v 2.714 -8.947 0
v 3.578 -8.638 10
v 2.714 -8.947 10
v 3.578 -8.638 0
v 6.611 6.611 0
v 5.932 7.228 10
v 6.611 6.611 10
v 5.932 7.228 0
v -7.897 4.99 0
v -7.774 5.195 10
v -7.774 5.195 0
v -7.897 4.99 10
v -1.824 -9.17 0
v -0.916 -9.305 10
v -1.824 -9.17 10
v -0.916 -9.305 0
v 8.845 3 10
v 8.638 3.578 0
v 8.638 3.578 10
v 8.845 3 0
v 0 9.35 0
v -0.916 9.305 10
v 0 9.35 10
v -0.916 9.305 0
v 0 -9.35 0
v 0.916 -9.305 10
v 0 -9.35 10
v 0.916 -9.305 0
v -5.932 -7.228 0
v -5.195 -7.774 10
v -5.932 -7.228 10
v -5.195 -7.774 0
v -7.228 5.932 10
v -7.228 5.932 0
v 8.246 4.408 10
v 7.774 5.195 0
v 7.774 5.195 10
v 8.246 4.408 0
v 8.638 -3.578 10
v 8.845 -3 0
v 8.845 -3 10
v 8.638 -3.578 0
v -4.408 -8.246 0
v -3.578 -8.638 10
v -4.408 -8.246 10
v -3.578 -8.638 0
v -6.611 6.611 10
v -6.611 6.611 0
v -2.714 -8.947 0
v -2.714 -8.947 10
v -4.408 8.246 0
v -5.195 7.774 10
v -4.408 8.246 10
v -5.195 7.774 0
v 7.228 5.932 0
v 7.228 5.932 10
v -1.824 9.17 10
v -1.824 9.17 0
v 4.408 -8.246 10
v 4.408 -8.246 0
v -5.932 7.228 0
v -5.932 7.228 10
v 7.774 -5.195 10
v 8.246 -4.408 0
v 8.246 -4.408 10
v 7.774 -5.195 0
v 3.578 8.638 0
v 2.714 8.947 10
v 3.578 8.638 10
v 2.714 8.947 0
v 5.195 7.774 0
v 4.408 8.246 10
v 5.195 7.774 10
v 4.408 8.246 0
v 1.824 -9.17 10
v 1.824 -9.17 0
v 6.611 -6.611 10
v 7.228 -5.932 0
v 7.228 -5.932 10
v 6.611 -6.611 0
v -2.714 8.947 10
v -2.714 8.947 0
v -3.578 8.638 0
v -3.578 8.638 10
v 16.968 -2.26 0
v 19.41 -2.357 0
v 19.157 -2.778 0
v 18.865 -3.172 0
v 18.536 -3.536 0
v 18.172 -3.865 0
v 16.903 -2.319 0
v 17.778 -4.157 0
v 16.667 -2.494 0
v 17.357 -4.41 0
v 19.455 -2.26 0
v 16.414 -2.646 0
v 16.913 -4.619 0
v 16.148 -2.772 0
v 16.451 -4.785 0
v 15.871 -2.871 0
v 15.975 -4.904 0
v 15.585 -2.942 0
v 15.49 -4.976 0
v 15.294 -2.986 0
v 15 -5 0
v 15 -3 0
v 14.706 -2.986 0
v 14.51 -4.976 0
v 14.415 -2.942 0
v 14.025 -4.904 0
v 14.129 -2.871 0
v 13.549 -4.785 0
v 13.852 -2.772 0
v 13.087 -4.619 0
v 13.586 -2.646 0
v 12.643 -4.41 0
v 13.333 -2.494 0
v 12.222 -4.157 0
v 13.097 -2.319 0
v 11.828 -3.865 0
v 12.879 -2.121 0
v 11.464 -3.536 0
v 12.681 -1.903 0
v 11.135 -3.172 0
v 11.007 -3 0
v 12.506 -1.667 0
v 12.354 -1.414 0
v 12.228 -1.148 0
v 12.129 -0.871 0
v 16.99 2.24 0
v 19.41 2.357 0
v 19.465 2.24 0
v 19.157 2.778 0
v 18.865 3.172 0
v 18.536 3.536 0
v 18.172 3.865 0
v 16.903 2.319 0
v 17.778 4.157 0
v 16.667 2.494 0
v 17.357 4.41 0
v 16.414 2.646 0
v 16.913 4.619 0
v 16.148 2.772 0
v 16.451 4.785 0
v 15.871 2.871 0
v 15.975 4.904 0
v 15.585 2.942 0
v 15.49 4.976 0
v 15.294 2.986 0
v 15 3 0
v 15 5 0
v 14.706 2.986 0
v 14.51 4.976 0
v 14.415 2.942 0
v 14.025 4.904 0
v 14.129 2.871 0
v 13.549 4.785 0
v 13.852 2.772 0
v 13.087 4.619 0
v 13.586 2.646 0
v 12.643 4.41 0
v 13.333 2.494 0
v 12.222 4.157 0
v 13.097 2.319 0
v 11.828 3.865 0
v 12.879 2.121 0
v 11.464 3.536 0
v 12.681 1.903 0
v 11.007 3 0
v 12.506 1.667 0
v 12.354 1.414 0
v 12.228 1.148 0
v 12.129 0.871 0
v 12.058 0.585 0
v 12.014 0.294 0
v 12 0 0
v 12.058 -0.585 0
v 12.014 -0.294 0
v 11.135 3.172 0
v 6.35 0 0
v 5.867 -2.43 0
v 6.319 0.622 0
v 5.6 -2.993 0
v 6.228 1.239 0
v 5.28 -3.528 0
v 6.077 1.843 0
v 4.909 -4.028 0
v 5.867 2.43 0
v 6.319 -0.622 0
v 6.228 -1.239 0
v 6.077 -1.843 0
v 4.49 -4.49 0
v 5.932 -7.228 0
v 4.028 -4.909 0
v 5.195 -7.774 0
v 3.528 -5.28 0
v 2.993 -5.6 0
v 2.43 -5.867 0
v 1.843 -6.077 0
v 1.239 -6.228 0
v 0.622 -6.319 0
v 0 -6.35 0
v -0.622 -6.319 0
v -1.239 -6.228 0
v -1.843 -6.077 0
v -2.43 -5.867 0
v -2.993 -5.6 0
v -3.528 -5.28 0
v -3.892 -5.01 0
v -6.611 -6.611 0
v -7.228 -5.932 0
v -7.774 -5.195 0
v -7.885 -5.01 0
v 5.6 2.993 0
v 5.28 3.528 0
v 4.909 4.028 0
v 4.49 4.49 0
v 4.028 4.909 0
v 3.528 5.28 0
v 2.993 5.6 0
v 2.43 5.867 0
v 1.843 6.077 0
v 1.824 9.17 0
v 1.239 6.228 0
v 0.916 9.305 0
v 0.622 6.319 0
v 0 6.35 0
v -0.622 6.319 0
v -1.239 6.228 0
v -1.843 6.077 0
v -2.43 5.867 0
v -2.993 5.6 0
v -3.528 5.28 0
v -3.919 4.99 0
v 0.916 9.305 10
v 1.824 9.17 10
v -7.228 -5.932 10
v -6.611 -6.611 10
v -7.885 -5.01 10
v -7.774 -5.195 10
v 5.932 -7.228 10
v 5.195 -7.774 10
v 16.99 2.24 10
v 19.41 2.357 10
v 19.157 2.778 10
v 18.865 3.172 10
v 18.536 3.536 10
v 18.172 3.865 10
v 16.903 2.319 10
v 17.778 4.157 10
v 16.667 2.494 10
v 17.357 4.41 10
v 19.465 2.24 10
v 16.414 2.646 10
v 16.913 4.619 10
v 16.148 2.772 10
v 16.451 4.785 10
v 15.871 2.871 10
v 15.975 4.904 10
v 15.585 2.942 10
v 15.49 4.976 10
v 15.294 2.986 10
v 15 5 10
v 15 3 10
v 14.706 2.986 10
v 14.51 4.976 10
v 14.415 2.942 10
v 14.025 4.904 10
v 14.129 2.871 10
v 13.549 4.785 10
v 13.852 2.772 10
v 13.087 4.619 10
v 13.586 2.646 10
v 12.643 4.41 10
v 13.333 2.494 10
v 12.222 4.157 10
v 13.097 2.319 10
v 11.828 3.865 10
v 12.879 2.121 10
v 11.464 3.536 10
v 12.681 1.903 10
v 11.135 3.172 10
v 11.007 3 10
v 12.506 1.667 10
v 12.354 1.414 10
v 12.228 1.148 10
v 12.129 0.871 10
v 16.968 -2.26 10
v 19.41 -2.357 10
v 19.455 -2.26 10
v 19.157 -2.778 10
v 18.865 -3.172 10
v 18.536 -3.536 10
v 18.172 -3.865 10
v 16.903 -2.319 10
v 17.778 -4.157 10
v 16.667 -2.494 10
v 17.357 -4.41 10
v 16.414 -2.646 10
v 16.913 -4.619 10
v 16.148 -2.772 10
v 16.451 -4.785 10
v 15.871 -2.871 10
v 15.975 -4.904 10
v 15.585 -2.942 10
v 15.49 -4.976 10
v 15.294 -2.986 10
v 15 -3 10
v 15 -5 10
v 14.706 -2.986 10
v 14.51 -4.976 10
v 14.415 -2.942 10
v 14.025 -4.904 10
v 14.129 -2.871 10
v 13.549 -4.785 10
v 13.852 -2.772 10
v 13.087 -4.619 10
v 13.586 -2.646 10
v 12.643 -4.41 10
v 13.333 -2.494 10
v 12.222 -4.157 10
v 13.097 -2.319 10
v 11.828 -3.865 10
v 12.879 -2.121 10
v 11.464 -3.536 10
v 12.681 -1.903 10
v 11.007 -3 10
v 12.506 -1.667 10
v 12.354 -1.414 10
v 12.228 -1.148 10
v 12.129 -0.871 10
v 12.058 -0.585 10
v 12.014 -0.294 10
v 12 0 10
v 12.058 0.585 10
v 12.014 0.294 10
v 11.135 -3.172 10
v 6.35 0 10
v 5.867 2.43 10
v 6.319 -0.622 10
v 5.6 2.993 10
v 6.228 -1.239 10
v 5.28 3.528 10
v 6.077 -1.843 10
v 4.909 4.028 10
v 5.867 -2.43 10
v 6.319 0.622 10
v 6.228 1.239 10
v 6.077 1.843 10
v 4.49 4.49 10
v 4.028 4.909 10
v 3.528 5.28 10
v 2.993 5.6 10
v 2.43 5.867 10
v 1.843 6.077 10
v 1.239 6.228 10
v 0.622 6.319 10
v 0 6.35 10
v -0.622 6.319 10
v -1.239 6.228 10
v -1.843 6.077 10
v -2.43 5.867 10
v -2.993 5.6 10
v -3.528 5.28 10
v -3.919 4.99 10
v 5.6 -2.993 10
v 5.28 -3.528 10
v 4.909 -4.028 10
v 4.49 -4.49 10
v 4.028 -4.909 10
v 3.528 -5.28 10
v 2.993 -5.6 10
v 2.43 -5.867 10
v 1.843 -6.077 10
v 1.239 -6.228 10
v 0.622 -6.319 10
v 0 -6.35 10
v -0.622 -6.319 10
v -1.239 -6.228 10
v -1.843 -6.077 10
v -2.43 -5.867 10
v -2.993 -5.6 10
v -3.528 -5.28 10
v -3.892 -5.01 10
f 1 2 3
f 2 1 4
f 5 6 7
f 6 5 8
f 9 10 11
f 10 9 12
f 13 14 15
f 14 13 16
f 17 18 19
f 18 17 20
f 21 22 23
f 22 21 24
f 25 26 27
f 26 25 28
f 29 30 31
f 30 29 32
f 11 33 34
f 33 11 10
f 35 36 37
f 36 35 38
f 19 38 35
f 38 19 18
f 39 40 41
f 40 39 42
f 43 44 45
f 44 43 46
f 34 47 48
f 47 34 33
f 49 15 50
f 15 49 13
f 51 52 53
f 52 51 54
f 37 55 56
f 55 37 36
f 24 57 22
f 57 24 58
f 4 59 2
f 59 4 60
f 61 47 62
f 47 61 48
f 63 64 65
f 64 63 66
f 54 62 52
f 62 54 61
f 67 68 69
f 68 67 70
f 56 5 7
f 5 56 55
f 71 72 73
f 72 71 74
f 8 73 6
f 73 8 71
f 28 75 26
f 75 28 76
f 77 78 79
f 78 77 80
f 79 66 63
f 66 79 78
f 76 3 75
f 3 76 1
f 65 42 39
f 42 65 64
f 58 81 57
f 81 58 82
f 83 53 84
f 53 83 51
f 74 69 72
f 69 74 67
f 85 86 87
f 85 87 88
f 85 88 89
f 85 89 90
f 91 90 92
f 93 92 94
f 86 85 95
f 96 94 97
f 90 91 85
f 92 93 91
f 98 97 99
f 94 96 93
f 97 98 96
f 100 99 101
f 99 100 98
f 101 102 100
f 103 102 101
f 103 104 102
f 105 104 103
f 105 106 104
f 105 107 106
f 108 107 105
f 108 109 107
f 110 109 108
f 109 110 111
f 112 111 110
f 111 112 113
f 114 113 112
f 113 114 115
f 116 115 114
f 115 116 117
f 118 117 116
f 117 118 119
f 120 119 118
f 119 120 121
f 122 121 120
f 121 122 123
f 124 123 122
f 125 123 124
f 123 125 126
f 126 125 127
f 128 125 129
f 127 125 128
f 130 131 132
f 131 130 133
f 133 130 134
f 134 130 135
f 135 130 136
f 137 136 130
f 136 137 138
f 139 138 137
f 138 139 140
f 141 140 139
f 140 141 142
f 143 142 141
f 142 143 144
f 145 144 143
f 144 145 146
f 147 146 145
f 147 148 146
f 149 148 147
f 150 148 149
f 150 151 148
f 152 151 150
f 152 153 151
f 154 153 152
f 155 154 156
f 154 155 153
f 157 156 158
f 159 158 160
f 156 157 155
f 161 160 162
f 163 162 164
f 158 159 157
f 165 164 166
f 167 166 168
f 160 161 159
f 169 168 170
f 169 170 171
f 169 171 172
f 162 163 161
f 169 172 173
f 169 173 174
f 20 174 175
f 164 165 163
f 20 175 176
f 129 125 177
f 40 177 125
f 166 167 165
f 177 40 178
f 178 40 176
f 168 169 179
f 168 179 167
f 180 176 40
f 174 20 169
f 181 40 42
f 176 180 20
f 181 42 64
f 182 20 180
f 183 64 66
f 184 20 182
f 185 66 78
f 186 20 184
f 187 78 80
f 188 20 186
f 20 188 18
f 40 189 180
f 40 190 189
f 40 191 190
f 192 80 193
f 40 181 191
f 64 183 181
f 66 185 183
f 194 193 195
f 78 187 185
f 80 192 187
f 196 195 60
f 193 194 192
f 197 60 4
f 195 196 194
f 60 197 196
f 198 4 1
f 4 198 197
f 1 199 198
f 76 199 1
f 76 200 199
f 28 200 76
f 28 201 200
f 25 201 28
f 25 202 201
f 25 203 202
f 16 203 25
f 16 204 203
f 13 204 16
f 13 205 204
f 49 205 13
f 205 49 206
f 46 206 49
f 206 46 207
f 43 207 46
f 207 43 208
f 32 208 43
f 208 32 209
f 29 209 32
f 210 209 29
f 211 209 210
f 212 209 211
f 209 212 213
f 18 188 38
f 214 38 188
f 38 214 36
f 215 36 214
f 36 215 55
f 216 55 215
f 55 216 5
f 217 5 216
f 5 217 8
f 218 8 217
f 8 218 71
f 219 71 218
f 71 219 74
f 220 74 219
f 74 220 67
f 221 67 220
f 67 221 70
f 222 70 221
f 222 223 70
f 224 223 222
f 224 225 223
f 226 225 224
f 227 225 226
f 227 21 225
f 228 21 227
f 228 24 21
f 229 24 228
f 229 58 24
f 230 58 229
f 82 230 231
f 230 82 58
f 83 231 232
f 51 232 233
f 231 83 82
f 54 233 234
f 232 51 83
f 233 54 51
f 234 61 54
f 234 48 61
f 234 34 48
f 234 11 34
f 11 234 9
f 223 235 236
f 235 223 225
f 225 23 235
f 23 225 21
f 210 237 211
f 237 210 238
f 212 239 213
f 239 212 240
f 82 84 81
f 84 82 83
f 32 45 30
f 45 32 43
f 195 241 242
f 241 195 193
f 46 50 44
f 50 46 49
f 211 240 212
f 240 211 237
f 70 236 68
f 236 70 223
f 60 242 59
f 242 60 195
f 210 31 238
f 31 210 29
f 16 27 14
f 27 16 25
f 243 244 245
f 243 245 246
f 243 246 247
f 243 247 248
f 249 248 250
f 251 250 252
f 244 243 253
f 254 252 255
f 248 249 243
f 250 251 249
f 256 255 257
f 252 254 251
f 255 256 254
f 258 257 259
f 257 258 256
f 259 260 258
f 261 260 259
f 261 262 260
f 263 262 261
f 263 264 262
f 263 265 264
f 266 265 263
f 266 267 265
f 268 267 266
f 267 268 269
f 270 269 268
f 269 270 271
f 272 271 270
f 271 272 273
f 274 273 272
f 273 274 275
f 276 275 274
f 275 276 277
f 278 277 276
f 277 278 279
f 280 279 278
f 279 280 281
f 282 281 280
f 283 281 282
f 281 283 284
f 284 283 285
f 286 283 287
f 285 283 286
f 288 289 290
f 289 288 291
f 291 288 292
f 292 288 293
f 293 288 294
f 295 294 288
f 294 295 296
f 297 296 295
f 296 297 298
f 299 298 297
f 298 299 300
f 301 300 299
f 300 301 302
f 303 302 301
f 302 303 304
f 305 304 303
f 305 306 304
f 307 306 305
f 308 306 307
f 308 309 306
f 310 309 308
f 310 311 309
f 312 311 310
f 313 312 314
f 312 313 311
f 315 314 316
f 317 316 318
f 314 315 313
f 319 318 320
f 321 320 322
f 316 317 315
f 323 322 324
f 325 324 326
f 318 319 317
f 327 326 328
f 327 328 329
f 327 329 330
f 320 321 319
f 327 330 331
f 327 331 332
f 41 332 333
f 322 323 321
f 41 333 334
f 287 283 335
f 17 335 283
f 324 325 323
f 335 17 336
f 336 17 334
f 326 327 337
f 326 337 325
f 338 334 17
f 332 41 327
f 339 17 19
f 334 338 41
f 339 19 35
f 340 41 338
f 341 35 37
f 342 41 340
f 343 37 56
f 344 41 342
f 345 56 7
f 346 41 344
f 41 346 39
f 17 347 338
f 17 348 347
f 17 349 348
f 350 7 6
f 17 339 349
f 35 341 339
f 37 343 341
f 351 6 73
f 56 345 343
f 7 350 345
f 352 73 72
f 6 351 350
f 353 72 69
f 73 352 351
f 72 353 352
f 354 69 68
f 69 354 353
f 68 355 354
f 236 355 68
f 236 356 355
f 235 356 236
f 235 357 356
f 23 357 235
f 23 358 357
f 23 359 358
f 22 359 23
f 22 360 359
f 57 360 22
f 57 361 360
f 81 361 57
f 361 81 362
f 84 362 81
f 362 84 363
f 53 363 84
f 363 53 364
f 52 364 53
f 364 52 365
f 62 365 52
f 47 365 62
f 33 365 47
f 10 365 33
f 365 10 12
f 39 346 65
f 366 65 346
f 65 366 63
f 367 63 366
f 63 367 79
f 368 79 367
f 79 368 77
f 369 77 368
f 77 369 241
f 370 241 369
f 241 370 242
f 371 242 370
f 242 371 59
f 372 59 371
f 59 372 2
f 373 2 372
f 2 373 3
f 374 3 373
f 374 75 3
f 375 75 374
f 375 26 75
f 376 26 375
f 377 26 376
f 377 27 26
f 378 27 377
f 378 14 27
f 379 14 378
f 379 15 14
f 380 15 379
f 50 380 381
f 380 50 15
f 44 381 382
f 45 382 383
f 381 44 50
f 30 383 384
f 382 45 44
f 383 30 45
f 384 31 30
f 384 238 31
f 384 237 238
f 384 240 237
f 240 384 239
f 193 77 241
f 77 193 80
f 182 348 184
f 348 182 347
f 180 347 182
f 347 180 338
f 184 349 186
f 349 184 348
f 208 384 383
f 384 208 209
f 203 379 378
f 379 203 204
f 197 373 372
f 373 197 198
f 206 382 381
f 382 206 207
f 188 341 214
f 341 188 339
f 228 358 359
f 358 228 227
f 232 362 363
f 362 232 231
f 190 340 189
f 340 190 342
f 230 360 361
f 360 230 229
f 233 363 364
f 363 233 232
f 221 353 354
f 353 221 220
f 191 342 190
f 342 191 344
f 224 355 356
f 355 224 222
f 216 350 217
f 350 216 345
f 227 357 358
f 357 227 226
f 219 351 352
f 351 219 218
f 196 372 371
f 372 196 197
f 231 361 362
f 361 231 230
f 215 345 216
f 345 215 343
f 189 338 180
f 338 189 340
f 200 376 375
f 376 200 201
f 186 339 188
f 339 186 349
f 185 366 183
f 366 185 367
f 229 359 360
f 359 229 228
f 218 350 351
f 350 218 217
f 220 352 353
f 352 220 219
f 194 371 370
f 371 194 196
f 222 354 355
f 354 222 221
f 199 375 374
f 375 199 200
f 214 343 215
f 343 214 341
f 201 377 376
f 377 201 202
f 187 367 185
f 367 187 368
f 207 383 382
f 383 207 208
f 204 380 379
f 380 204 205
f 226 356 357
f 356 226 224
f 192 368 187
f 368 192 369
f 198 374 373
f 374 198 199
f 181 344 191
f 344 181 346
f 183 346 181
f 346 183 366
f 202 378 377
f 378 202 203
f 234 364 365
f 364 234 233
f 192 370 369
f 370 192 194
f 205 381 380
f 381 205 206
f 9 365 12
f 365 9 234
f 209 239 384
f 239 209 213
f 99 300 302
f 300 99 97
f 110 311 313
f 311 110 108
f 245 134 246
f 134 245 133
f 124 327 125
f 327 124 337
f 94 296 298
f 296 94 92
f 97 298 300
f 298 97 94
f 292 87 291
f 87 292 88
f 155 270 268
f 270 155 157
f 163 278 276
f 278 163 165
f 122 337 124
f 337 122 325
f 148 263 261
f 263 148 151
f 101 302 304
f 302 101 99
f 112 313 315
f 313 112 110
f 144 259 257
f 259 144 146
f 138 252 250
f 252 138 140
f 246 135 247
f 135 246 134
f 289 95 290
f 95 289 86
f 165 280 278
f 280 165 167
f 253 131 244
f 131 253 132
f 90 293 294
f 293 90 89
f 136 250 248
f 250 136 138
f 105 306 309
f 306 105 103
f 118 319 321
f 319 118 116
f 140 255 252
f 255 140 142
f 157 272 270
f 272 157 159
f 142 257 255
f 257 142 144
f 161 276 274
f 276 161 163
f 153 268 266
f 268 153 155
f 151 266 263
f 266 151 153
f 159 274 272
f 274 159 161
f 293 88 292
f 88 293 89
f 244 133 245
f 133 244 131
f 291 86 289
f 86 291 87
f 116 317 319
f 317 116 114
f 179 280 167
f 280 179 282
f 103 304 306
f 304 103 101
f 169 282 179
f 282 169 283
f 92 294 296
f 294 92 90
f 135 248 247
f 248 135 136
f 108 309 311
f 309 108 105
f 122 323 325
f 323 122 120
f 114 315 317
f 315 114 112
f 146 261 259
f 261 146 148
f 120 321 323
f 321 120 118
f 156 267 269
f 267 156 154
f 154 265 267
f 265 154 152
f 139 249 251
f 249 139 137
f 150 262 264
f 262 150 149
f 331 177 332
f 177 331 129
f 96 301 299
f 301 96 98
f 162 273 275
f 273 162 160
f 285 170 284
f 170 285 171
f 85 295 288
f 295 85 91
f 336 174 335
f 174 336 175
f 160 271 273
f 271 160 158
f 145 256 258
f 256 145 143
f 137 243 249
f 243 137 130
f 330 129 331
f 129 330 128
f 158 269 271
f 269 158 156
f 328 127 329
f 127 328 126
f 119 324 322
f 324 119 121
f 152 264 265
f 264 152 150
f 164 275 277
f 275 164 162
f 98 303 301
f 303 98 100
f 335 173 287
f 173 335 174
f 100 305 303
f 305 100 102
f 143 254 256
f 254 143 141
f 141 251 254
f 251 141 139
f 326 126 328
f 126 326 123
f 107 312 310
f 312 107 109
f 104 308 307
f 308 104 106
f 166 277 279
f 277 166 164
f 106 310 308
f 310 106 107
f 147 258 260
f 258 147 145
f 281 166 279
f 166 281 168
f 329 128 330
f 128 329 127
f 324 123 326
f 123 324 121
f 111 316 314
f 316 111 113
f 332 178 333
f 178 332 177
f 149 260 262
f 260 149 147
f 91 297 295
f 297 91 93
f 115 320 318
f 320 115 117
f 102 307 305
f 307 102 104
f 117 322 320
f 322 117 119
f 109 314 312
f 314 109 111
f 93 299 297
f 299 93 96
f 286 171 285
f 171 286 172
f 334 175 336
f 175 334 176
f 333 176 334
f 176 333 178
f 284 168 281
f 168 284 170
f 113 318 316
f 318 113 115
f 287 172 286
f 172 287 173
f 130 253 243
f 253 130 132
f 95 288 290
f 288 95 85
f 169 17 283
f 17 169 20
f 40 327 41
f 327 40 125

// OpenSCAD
// Snap‑on clip for tubing and lab stand rod

$fn = 64; // resolution for cylinders

// Dimensions
rod_inner_d = 12.7; // mm
rod_wall     = 3;   // mm
rod_outer_d = rod_inner_d + 2*rod_wall; // mm

tub_inner_d = 6;   // mm
tub_wall     = 2;   // mm
tub_outer_d = tub_inner_d + 2*tub_wall; // mm

extrude_h   = 10; // mm

// Opening dimensions
rod_open_y = 10;   // mm (width of opening on rod side)
tub_open_y = 4.5;  // mm (width of opening on tubing side)

// Bridge dimensions
bridge_x_start = 8;   // mm
bridge_x_end   = 12;  // mm
bridge_y_width = 6;   // mm
bridge_z_height = extrude_h; // mm

// Derived dimensions for openings
rod_open_x     = rod_outer_d/2 + 0.02; // mm
rod_open_z     = extrude_h + 0.02;      // mm
rod_open_x_start = -rod_outer_d/2 - 0.01; // mm
rod_open_y_start = -rod_open_y/2 - 0.01; // mm
rod_open_z_start = -0.01;                 // mm

tub_open_x     = tub_outer_d/2 + 0.02; // mm
tub_open_z     = extrude_h + 0.02;      // mm
tub_open_x_start = 15 + 0.01;           // mm
tub_open_y_start = -tub_open_y/2 - 0.01; // mm
tub_open_z_start = -0.01;                 // mm

// Modules
module rod_ring() {
    difference() {
        cylinder(h=extrude_h, d=rod_outer_d);
        cylinder(h=extrude_h, d=rod_inner_d);
        translate([rod_open_x_start, rod_open_y_start, rod_open_z_start])
            cube([rod_open_x, rod_open_y, rod_open_z]);
    }
}

module tub_ring() {
    difference() {
        translate([15,0,0]) cylinder(h=extrude_h, d=tub_outer_d);
        translate([15,0,0]) cylinder(h=extrude_h, d=tub_inner_d);
        translate([tub_open_x_start, tub_open_y_start, tub_open_z_start])
            cube([tub_open_x, tub_open_y, tub_open_z]);
    }
}

module bridge() {
    translate([bridge_x_start, -bridge_y_width/2, 0])
        cube([bridge_x_end - bridge_x_start, bridge_y_width, bridge_z_height]);
}

union() {
    rod_ring();
    tub_ring();
    bridge();
}
